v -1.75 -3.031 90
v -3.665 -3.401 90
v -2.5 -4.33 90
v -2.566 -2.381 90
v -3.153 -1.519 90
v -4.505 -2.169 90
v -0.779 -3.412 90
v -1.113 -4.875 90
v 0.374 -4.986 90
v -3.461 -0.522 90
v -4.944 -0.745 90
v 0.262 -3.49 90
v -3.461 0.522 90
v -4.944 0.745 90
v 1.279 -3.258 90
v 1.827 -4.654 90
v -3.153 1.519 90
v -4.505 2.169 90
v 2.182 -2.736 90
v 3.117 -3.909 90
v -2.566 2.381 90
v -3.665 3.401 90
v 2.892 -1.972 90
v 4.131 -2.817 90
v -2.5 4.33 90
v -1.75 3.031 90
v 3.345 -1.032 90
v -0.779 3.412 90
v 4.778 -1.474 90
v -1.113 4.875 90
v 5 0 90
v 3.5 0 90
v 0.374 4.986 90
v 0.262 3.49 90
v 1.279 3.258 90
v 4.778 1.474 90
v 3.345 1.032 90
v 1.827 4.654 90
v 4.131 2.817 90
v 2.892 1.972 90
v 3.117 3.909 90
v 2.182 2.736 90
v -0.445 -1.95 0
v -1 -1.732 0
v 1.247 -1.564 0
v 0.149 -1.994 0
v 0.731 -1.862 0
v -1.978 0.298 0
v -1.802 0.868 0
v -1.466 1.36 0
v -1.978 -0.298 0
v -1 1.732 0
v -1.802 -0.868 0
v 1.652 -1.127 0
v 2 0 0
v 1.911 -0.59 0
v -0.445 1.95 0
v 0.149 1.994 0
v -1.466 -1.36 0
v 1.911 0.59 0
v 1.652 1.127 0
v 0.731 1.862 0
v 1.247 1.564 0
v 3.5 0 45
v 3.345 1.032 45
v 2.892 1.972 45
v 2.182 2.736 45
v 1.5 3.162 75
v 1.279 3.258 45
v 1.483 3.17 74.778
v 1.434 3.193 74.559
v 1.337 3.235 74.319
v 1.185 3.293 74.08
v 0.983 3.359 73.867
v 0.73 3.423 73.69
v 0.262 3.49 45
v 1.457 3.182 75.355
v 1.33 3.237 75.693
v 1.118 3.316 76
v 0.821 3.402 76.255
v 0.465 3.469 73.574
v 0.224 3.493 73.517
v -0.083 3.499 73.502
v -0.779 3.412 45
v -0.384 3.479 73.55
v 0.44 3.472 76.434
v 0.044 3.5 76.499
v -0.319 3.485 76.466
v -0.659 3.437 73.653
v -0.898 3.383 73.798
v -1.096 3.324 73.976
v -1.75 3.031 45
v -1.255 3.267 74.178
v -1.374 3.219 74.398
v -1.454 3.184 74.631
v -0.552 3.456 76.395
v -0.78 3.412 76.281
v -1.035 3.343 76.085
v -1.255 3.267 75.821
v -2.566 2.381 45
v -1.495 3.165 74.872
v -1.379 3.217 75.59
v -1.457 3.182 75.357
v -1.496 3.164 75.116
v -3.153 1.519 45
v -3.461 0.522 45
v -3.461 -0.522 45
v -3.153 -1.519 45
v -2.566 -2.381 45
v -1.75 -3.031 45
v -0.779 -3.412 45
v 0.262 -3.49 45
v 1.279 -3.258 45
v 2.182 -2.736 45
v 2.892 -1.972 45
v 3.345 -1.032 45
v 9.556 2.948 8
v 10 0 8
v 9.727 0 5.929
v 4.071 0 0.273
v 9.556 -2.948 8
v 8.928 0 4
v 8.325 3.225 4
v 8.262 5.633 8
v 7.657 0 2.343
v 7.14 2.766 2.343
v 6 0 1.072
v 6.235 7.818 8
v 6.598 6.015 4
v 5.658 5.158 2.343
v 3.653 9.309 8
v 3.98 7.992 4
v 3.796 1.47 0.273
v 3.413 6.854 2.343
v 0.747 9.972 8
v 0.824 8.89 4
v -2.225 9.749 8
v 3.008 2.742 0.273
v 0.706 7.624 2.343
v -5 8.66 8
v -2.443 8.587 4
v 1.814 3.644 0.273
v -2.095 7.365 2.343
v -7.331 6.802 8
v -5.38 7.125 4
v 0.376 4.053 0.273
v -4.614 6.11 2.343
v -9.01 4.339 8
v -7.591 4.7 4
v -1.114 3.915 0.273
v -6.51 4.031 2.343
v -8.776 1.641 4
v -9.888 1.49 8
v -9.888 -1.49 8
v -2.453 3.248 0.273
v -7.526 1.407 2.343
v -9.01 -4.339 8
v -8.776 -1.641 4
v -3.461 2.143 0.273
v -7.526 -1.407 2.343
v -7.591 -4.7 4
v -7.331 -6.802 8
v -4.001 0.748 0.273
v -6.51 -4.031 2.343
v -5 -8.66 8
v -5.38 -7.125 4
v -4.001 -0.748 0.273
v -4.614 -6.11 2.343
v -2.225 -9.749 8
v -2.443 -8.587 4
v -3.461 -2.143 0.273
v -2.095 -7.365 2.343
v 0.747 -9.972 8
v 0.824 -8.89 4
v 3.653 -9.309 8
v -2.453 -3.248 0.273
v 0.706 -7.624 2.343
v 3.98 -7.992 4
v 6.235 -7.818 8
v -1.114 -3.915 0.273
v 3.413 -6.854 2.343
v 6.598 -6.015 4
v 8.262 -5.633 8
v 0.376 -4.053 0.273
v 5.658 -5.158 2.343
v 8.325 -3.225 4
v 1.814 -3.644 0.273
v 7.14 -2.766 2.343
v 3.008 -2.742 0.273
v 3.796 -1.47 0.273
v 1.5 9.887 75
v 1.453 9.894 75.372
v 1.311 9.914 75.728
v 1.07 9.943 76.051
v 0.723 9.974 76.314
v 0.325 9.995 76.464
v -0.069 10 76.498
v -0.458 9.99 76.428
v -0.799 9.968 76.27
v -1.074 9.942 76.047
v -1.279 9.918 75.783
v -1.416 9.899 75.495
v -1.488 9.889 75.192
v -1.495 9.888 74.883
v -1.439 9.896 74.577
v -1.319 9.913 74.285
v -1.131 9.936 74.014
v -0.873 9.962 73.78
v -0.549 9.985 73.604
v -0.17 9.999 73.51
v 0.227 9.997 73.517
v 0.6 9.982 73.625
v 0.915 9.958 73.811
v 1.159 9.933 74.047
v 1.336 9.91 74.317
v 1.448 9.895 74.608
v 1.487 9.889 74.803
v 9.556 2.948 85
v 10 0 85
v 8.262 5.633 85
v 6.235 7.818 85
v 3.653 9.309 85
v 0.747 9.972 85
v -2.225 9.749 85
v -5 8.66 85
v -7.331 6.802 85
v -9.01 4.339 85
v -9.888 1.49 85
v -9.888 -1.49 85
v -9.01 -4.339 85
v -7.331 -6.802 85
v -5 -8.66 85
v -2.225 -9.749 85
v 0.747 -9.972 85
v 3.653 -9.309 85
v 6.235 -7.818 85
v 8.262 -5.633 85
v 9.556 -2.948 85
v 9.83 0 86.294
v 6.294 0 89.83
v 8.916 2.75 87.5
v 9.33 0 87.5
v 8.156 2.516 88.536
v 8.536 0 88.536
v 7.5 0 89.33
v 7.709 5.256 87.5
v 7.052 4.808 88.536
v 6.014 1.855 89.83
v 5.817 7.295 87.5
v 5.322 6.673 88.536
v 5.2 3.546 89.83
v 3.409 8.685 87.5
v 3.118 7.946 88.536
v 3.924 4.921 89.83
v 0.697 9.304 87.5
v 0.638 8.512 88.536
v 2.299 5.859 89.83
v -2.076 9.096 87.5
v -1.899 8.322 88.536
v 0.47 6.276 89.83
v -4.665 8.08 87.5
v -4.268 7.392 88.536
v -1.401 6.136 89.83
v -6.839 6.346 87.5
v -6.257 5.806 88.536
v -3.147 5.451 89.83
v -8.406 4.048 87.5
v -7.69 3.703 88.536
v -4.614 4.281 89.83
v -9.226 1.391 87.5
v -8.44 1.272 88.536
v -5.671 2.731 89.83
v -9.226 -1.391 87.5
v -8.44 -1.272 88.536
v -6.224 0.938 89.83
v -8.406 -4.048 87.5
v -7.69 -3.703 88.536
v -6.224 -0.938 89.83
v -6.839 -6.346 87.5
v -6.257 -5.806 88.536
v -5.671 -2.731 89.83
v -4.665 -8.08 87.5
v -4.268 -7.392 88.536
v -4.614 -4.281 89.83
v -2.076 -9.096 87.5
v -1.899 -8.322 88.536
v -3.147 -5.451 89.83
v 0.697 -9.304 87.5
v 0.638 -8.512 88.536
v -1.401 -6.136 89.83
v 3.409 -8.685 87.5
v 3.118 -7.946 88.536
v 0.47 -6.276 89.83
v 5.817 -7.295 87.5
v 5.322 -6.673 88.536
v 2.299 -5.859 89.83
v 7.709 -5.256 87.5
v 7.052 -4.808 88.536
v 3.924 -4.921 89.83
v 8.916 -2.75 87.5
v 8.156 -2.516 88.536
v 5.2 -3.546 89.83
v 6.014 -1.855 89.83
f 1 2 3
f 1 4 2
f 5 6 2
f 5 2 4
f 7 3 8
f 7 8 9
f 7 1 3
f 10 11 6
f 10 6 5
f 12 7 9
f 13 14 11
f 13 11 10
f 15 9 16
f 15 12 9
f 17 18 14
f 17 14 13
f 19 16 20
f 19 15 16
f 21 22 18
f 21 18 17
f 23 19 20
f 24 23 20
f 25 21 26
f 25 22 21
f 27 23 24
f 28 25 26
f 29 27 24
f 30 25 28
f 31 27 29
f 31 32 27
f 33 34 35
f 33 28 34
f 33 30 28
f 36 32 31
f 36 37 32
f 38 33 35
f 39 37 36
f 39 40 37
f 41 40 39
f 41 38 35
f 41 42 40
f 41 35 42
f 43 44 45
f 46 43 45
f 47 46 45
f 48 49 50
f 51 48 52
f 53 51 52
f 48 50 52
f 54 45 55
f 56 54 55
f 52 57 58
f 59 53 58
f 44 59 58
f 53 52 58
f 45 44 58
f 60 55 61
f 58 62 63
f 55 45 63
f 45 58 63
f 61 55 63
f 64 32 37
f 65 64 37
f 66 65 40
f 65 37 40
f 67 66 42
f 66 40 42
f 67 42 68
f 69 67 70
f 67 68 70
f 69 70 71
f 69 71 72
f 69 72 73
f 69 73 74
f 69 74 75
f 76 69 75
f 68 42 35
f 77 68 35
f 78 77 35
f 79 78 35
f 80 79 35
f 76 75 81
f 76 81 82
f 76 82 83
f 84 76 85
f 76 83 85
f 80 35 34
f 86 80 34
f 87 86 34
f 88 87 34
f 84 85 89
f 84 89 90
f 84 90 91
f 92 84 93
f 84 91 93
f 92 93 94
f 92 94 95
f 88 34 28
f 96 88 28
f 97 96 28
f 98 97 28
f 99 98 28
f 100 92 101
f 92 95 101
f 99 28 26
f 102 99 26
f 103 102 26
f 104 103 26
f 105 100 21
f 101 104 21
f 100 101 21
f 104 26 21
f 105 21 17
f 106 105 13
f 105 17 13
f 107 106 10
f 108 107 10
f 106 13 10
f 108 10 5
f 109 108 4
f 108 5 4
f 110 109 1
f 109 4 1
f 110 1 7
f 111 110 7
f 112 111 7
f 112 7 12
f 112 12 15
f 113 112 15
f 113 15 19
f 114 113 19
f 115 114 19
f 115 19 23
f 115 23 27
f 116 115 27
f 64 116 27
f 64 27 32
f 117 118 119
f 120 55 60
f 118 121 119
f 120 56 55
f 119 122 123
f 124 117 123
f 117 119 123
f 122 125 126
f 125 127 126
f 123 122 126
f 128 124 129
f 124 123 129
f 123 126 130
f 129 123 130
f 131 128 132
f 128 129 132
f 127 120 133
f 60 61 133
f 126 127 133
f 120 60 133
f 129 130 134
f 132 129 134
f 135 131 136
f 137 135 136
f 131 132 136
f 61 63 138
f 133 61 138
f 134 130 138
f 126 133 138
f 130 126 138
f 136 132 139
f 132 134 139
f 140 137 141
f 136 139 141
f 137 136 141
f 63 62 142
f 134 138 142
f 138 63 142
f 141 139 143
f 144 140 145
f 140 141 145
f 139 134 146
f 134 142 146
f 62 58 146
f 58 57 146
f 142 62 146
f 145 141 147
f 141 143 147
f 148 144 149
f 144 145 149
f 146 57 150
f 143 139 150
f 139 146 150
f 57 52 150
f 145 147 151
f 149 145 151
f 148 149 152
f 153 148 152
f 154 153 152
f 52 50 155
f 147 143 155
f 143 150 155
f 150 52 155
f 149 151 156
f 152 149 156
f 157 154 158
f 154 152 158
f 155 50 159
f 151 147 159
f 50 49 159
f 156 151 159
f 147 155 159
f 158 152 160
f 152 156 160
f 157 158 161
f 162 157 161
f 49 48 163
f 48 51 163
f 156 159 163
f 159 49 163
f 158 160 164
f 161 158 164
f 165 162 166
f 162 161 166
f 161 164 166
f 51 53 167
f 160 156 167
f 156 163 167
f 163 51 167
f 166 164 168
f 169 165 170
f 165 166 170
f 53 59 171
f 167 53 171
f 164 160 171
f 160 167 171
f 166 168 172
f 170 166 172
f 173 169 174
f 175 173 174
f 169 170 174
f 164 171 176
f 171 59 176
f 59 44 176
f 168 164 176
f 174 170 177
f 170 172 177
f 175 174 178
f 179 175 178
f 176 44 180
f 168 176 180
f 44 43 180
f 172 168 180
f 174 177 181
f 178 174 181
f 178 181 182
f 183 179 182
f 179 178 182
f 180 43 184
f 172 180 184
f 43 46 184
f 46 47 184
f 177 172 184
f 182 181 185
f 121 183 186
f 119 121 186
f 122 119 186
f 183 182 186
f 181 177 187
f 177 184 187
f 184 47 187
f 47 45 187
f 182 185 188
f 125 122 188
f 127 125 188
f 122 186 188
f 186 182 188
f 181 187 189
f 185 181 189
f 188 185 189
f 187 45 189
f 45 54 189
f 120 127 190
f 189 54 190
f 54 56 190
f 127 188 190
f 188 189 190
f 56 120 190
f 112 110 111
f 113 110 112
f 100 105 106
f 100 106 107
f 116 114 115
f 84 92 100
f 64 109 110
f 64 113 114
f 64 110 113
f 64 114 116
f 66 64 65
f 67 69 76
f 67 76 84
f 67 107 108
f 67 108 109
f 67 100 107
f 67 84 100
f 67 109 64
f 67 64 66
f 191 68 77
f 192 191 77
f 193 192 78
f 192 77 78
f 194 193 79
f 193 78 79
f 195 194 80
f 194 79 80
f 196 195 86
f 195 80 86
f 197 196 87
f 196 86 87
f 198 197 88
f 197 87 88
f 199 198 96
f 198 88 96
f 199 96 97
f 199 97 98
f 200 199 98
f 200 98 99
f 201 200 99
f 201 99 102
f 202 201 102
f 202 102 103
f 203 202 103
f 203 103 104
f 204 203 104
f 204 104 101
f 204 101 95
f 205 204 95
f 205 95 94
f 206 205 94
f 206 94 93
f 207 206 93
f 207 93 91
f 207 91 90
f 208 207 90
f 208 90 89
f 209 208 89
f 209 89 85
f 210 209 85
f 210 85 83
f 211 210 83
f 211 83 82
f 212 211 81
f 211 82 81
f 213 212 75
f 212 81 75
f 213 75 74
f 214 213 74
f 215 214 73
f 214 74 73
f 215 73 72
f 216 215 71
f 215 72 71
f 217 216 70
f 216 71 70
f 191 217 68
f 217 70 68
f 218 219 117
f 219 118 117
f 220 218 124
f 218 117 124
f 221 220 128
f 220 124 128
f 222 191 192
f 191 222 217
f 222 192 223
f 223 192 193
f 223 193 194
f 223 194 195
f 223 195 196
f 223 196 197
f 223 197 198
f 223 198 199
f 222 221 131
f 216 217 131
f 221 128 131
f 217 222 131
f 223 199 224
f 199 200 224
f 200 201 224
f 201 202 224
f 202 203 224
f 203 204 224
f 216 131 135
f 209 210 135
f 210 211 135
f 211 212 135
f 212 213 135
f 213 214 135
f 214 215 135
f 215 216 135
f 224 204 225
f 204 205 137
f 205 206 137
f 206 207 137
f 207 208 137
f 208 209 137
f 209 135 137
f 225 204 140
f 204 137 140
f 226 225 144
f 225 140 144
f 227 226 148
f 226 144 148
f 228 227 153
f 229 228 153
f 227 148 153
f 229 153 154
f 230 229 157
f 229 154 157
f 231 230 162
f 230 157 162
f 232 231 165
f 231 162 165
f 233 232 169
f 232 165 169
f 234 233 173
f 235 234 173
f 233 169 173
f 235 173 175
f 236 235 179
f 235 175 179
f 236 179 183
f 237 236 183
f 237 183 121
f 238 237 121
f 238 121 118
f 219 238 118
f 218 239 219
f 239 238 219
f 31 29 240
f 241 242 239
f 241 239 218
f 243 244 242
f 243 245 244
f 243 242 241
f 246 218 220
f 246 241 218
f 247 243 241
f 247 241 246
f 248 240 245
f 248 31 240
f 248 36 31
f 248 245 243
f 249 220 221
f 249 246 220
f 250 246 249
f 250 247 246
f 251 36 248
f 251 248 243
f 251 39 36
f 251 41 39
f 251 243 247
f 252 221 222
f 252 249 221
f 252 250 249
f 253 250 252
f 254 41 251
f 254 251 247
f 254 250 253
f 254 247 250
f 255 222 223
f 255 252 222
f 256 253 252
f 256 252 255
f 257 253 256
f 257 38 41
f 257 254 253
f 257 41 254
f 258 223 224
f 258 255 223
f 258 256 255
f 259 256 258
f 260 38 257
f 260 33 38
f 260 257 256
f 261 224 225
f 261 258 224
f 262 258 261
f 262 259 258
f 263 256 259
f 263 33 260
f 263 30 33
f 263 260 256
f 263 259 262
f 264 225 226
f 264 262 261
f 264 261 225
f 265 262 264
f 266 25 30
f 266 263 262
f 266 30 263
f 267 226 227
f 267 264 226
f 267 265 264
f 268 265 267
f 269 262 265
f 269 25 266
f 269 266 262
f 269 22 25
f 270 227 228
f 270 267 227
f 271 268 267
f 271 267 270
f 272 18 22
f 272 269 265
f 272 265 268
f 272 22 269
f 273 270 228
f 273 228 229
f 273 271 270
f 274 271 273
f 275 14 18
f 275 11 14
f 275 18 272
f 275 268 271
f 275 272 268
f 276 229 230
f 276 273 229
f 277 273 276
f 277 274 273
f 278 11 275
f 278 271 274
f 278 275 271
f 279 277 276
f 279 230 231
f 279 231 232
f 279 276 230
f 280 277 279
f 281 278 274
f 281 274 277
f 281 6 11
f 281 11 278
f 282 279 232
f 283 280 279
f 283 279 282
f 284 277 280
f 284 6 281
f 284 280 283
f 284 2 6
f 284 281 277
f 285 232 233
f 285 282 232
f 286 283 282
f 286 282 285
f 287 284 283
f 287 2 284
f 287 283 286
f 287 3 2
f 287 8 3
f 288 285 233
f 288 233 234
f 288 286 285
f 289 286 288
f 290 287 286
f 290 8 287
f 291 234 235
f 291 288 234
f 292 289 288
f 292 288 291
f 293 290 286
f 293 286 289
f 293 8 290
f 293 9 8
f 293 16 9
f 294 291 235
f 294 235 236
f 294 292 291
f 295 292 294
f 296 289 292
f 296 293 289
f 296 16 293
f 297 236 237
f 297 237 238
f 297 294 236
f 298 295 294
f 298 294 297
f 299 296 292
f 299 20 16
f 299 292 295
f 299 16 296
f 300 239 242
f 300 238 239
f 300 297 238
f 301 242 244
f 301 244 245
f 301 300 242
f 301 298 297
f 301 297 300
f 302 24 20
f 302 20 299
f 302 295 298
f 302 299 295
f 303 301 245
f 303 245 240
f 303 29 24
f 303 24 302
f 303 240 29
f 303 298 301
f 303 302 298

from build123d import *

# Parameters (mm, degrees)
F0_R     = 10
F1_DEPTH = 90
F2_R     = 8
F3_R     = 5
F4_R     = 3.5
F5_DEPTH = 45
F6_R     = 1.5
F7_DEPTH = 10.001


with BuildPart() as f1:
    # F0 (on Top) → F1 (new body)
    with BuildSketch(Plane.XY):
        Circle(F0_R)
    extrude(amount=F1_DEPTH)

    # F2
    f2_edges = [f1.edges().sort_by_distance(p)[0] for p in [
        (-10, 0, 0),
    ]]
    fillet(f2_edges, radius=F2_R)

    # F3
    f3_edges = [f1.edges().sort_by_distance(p)[0] for p in [
        (-10, 0, 90),
    ]]
    fillet(f3_edges, radius=F3_R)

    # F4 (on face) → F5 (cut)
    with BuildSketch(Plane.XY.offset(90)):
        Circle(F4_R)
    extrude(amount=-F5_DEPTH, mode=Mode.SUBTRACT)

    # F6 (on Front) → F7 (cut, through all)
    with BuildSketch(Plane.XZ):
        with Locations((0, 75)):
            Circle(F6_R)
    extrude(amount=-F7_DEPTH, mode=Mode.SUBTRACT)


solid = f1.part
